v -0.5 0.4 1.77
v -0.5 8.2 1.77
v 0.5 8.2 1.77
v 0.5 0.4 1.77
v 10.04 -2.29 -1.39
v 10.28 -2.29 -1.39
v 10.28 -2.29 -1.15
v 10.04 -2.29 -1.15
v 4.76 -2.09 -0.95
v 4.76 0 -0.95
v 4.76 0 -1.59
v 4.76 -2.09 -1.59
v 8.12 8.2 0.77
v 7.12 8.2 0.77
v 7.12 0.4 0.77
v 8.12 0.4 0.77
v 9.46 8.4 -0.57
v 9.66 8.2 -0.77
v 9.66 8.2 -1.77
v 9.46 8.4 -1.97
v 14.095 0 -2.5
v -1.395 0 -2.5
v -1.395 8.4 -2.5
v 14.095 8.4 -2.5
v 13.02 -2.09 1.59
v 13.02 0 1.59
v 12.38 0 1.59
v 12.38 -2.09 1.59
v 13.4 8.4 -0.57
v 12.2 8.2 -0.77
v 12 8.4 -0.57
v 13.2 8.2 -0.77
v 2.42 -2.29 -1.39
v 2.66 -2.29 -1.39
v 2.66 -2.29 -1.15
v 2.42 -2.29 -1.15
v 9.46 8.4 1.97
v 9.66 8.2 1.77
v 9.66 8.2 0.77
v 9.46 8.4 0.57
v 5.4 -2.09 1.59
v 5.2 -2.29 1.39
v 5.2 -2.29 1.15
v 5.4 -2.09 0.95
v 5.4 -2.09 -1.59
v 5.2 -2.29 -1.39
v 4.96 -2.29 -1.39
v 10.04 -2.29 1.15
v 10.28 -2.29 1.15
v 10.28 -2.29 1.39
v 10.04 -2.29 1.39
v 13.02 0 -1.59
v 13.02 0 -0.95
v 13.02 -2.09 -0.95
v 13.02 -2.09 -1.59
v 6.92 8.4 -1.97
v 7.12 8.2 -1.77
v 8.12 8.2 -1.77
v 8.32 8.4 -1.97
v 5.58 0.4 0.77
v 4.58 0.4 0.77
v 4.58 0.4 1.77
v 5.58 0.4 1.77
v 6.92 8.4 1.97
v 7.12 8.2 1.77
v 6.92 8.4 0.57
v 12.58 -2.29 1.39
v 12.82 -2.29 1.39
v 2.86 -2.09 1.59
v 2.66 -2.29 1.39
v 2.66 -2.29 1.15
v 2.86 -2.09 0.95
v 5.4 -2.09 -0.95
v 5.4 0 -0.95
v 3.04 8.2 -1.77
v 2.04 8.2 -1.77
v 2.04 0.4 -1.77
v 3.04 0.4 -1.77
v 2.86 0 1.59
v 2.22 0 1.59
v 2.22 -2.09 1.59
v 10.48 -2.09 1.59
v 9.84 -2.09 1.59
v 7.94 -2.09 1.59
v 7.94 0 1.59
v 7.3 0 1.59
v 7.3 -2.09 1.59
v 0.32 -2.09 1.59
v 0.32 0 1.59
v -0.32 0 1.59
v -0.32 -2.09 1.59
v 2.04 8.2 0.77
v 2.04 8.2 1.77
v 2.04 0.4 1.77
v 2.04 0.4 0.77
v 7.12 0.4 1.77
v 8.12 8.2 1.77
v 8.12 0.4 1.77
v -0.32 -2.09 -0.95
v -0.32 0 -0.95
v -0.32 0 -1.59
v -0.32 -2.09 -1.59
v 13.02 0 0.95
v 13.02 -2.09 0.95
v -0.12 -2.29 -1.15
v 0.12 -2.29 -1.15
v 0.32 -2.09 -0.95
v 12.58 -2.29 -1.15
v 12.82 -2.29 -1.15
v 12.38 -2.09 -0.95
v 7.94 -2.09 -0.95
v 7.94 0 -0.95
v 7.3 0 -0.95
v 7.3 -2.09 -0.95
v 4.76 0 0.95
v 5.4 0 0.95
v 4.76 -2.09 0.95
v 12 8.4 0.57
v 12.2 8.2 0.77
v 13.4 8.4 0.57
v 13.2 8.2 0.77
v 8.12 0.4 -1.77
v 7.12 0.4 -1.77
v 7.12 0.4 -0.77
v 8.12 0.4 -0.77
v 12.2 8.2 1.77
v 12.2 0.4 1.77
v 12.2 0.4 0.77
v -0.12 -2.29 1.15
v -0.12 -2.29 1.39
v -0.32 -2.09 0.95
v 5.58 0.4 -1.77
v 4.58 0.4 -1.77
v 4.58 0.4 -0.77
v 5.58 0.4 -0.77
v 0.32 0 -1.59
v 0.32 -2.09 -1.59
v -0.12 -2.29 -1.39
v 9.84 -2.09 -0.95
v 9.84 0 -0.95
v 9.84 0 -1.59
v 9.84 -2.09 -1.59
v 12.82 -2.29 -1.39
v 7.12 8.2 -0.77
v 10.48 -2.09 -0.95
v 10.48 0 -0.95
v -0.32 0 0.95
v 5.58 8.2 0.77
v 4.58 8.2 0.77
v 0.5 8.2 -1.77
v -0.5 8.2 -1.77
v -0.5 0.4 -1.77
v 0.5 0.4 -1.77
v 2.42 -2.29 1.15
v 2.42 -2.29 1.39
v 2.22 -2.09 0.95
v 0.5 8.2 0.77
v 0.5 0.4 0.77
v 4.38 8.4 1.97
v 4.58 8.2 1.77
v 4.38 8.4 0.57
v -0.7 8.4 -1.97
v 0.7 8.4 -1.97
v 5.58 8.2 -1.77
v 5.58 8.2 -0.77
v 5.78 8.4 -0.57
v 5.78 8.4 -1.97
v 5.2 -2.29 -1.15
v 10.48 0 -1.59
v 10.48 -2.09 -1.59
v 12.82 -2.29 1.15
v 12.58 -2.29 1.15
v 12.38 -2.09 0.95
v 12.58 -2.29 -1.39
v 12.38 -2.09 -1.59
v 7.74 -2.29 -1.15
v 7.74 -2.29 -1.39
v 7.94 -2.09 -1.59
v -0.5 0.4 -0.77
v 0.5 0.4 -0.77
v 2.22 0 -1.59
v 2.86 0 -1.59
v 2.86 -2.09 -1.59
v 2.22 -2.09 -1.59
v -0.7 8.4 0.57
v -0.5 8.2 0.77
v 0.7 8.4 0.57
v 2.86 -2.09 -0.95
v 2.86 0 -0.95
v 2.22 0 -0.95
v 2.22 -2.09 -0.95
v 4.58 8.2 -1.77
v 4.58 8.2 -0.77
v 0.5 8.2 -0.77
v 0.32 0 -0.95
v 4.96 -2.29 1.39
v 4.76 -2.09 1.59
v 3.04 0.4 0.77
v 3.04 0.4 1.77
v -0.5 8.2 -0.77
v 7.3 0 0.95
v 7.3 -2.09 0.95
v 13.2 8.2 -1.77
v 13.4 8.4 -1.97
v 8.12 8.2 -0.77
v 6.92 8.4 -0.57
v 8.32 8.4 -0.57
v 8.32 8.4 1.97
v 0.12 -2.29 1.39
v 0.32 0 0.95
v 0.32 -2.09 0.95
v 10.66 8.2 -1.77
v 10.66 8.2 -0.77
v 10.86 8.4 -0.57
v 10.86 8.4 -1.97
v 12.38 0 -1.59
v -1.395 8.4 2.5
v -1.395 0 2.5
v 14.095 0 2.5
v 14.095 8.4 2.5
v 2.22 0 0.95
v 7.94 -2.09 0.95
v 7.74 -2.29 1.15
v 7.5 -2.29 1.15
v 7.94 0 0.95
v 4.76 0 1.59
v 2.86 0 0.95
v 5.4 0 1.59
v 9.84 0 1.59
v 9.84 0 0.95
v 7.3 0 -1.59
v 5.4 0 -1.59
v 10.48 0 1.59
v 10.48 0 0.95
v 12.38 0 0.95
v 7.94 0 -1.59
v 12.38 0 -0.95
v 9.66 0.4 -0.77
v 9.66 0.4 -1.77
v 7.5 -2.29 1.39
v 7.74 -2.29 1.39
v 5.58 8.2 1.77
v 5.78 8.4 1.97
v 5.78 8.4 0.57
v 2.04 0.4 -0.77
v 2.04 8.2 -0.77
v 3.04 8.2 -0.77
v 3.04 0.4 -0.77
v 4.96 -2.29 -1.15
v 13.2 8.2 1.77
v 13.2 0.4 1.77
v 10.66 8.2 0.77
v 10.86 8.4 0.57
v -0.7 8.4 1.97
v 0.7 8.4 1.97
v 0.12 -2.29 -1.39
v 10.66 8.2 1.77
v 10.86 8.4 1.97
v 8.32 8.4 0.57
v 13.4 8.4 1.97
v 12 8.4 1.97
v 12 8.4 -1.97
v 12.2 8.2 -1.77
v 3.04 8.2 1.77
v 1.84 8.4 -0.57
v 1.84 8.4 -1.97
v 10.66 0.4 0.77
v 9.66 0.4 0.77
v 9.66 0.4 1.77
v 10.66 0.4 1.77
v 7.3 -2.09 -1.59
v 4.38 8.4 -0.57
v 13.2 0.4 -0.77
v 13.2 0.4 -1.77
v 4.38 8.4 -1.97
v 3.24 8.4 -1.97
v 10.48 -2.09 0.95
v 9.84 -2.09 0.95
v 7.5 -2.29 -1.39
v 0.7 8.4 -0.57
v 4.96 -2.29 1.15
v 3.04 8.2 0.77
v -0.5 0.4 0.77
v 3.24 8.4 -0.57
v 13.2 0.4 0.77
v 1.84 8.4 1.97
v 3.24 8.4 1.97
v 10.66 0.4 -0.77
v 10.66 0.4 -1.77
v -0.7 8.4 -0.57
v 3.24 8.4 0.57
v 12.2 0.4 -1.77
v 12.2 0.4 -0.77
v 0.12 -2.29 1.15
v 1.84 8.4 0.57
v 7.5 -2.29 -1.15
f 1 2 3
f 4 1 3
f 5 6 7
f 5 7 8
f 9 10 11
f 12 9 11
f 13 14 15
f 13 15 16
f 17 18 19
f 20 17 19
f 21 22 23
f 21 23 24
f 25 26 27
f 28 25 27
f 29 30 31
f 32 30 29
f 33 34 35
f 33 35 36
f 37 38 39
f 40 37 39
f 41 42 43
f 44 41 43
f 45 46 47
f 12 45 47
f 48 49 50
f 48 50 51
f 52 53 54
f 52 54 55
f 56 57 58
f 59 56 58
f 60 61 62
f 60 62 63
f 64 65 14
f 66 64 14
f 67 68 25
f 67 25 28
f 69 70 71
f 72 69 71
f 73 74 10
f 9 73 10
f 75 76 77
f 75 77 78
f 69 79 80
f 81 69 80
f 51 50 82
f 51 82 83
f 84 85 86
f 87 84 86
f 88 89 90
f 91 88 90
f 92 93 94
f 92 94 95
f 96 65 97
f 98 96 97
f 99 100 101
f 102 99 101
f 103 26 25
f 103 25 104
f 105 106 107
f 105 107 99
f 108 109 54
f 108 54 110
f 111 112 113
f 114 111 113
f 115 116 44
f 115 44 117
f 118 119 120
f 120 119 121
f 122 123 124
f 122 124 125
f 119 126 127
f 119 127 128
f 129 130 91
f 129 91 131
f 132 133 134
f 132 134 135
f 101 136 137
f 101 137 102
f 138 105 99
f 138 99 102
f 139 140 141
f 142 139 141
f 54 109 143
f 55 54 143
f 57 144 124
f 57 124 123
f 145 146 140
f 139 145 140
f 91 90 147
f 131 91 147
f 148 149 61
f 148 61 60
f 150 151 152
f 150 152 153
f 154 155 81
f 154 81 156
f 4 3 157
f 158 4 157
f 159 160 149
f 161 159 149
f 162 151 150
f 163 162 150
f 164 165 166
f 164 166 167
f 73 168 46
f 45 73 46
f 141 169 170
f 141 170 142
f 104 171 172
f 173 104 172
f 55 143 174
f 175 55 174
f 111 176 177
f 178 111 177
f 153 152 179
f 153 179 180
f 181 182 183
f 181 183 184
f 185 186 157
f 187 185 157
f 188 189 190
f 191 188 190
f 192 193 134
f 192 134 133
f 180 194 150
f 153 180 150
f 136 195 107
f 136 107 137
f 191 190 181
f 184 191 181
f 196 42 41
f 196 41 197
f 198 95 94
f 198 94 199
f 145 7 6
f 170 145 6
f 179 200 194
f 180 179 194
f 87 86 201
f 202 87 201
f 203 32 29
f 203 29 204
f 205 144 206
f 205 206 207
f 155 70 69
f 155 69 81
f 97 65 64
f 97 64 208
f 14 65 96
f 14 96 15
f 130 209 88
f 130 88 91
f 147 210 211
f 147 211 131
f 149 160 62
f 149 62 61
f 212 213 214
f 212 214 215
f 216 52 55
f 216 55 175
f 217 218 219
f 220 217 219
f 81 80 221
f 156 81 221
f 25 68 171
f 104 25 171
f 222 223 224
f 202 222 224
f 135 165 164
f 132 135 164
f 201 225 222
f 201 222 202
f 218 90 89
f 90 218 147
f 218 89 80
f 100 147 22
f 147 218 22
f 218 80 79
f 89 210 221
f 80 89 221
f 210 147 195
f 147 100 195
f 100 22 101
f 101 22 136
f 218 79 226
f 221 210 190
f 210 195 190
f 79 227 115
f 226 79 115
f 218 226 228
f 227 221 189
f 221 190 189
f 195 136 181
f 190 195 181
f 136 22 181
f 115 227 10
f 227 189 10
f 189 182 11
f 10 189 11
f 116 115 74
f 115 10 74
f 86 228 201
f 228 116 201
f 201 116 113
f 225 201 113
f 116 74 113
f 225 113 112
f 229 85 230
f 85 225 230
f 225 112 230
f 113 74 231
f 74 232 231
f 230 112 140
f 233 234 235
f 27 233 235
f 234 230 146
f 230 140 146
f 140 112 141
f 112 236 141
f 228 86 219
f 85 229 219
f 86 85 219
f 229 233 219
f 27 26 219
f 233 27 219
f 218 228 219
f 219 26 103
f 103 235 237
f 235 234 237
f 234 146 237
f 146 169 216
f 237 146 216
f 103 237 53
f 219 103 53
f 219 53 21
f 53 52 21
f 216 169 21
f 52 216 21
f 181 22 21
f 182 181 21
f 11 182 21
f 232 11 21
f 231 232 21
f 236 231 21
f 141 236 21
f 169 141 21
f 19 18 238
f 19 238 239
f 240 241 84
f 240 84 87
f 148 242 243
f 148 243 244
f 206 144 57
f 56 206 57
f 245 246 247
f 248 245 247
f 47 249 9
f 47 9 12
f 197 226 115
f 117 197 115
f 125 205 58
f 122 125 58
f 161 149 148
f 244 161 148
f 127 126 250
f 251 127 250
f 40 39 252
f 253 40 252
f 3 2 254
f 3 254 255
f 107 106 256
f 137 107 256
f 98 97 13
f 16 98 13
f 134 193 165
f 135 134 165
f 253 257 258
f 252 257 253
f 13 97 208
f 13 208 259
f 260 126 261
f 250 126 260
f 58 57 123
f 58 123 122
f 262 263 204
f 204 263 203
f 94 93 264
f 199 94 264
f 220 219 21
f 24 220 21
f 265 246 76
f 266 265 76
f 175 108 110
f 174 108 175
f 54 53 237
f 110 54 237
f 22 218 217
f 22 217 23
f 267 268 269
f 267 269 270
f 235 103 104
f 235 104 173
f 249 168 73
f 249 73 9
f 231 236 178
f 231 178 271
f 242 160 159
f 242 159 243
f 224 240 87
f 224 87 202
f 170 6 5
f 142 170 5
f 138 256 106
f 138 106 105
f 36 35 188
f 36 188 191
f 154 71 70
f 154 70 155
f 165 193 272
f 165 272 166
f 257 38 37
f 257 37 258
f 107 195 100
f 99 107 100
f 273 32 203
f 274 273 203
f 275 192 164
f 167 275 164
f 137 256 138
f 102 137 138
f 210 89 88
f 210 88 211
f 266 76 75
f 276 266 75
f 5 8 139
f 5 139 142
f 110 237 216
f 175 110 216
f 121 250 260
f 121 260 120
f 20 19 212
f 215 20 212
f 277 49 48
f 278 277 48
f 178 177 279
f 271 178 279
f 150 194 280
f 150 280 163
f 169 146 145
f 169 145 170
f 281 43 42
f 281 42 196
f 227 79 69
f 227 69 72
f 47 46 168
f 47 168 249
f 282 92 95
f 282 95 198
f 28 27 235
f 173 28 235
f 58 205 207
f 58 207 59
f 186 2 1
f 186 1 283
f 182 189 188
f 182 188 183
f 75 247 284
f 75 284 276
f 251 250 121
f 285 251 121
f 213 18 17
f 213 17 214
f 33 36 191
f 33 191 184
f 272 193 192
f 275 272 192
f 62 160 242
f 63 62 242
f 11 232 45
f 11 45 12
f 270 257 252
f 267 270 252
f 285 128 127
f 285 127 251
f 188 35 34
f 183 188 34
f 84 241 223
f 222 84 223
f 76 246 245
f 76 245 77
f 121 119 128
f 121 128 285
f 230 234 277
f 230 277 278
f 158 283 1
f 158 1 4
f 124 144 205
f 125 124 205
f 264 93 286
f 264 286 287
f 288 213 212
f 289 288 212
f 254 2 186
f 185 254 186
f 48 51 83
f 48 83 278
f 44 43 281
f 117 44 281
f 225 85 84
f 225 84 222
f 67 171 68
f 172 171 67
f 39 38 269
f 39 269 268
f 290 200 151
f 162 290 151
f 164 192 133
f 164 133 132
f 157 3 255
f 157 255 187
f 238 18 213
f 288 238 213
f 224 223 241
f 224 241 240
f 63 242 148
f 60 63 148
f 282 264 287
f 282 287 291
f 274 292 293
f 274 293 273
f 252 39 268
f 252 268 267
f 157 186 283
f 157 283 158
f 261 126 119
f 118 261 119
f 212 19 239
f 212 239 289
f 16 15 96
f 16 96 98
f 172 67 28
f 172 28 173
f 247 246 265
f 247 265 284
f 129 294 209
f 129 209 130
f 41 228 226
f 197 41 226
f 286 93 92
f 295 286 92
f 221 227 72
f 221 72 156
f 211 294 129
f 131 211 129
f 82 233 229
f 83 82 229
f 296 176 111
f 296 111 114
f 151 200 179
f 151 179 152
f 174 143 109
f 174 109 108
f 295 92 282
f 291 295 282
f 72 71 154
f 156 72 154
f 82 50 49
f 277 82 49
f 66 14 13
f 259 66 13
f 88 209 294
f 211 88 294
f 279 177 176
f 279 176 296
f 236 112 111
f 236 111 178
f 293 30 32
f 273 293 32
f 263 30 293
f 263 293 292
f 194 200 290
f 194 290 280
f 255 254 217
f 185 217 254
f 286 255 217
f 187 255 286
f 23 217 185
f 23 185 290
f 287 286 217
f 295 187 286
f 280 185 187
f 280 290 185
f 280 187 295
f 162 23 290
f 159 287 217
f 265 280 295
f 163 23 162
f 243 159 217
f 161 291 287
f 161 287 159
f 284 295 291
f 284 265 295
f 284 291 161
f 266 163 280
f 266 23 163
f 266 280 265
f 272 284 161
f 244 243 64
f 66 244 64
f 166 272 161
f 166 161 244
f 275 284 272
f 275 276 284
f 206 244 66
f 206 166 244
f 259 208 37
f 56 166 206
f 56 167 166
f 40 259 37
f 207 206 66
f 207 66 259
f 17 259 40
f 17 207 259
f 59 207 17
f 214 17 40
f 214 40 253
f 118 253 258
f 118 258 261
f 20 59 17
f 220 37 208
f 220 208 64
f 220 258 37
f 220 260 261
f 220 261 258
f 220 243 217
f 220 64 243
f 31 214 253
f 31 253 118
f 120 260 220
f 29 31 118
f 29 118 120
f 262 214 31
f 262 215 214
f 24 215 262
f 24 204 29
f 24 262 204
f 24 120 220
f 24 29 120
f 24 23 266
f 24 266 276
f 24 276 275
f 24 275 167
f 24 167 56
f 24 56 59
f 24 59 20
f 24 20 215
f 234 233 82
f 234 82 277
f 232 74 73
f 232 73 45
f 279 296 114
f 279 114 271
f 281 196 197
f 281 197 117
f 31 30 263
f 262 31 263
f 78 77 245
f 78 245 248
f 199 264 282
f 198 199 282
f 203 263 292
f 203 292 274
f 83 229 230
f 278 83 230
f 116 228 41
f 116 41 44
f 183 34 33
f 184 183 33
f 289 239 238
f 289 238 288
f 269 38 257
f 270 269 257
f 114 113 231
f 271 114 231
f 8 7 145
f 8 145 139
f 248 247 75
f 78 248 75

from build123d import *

# Parameters (mm, degrees)
SKETCH_1_W                         = 2.79
SKETCH_1_H                         = 5
EXTRUDE_1_DEPTH                    = 8.4
SKETCH_2_W                         = 1
SKETCH_2_H                         = 1
CUT_EXTRUDE_1_DEPTH                = 8
CHAMFER_1_SIZE                     = 0.2
SKETCH_3_W                         = 0.64
SKETCH_3_H                         = 0.64
EXTRUDE_2_DEPTH                    = 2.29
CHAMFER_2_SIZE                     = 0.2
PATTERN_LINEAR_1_COUNT             = 6
PATTERN_LINEAR_1_PITCH             = 2.54
CHAMFER_1_OF_PATTERN_LINEAR_1_SIZE = 0.2
CHAMFER_2_OF_PATTERN_LINEAR_1_SIZE = 0.2


with BuildPart() as part:
    # Эскиз1 → Бобышка-Вытянуть1 (new body)
    with BuildSketch(Plane(origin=(0, 0, 0), x_dir=(1, 0, 0), z_dir=(0, 1, 0))):
        Rectangle(SKETCH_1_W, SKETCH_1_H)
    extrude_1 = extrude(amount=EXTRUDE_1_DEPTH)

    # Эскиз2 → Вырез-Вытянуть1 (cut)
    with BuildSketch(Plane(origin=(0, 8.4, 0), x_dir=(1, 0, 0), z_dir=(0, 1, 0))):
        with Locations((0, 1.27)):
            Rectangle(SKETCH_2_W, SKETCH_2_H)
        with Locations((0, -1.27)):
            Rectangle(SKETCH_2_W, SKETCH_2_H)
    cut_extrude_1 = extrude(amount=-CUT_EXTRUDE_1_DEPTH, mode=Mode.SUBTRACT)

    # Фаска1
    chamfer_1_edges = [part.edges().sort_by_distance(p)[0] for p in [
        (0.5, 8.4, -1.27),
        (0, 8.4, -1.77),
        (-0.5, 8.4, -1.27),
        (0, 8.4, -0.77),
        (0, 8.4, 1.77),
        (0.5, 8.4, 1.27),
        (0, 8.4, 0.77),
        (-0.5, 8.4, 1.27),
    ]]
    chamfer(chamfer_1_edges, length=CHAMFER_1_SIZE)

    # Эскиз3 → Бобышка-Вытянуть2 (add)
    with BuildSketch(Plane(origin=(0, 0, 0), x_dir=(-1, 0, 0), z_dir=(0, -1, 0))):
        with Locations((0, 1.27)):
            Rectangle(SKETCH_3_W, SKETCH_3_H)
        with Locations((0, -1.27)):
            Rectangle(SKETCH_3_W, SKETCH_3_H)
    extrude_2 = extrude(amount=EXTRUDE_2_DEPTH)

    # Фаска2
    chamfer_2_edges = [part.edges().sort_by_distance(p)[0] for p in [
        (0.32, -2.29, -1.27),
        (0, -2.29, -0.95),
        (-0.32, -2.29, -1.27),
        (0, -2.29, -1.59),
        (-0.32, -2.29, 1.27),
        (0, -2.29, 0.95),
        (0.32, -2.29, 1.27),
        (0, -2.29, 1.59),
    ]]
    chamfer(chamfer_2_edges, length=CHAMFER_2_SIZE)

    # Линейный массив1: Бобышка-Вытянуть1, Вырез-Вытянуть1, Бобышка-Вытянуть2 ×6
    with Locations(*[(i * PATTERN_LINEAR_1_PITCH, 0, 0) for i in range(1, PATTERN_LINEAR_1_COUNT)]):
        add(extrude_1)
        add(cut_extrude_1, mode=Mode.SUBTRACT)
        add(extrude_2)

    # Фаска1 of Линейный массив1
    chamfer_1_of_pattern_linear_1_edges = [part.edges().sort_by_distance(p)[0] for p in [
        (3.04, 8.4, -1.27),
        (2.54, 8.4, -1.77),
        (2.04, 8.4, -1.27),
        (2.54, 8.4, -0.77),
        (2.54, 8.4, 1.77),
        (3.04, 8.4, 1.27),
        (2.54, 8.4, 0.77),
        (2.04, 8.4, 1.27),
        (5.58, 8.4, -1.27),
        (5.08, 8.4, -1.77),
        (4.58, 8.4, -1.27),
        (5.08, 8.4, -0.77),
        (5.08, 8.4, 1.77),
        (5.58, 8.4, 1.27),
        (5.08, 8.4, 0.77),
        (4.58, 8.4, 1.27),
        (8.12, 8.4, -1.27),
        (7.62, 8.4, -1.77),
        (7.12, 8.4, -1.27),
        (7.62, 8.4, -0.77),
        (7.62, 8.4, 1.77),
        (8.12, 8.4, 1.27),
        (7.62, 8.4, 0.77),
        (7.12, 8.4, 1.27),
        (10.66, 8.4, -1.27),
        (10.16, 8.4, -1.77),
        (9.66, 8.4, -1.27),
        (10.16, 8.4, -0.77),
        (10.16, 8.4, 1.77),
        (10.66, 8.4, 1.27),
        (10.16, 8.4, 0.77),
        (9.66, 8.4, 1.27),
        (13.2, 8.4, -1.27),
        (12.7, 8.4, -1.77),
        (12.2, 8.4, -1.27),
        (12.7, 8.4, -0.77),
        (12.7, 8.4, 1.77),
        (13.2, 8.4, 1.27),
        (12.7, 8.4, 0.77),
        (12.2, 8.4, 1.27),
    ]]
    chamfer(chamfer_1_of_pattern_linear_1_edges, length=CHAMFER_1_OF_PATTERN_LINEAR_1_SIZE)

    # Фаска2 of Линейный массив1
    chamfer_2_of_pattern_linear_1_edges = [part.edges().sort_by_distance(p)[0] for p in [
        (2.86, -2.29, -1.27),
        (2.54, -2.29, -0.95),
        (2.22, -2.29, -1.27),
        (2.54, -2.29, -1.59),
        (2.22, -2.29, 1.27),
        (2.54, -2.29, 0.95),
        (2.86, -2.29, 1.27),
        (2.54, -2.29, 1.59),
        (5.4, -2.29, -1.27),
        (5.08, -2.29, -0.95),
        (4.76, -2.29, -1.27),
        (5.08, -2.29, -1.59),
        (4.76, -2.29, 1.27),
        (5.08, -2.29, 0.95),
        (5.4, -2.29, 1.27),
        (5.08, -2.29, 1.59),
        (7.94, -2.29, -1.27),
        (7.62, -2.29, -0.95),
        (7.3, -2.29, -1.27),
        (7.62, -2.29, -1.59),
        (7.3, -2.29, 1.27),
        (7.62, -2.29, 0.95),
        (7.94, -2.29, 1.27),
        (7.62, -2.29, 1.59),
        (10.48, -2.29, -1.27),
        (10.16, -2.29, -0.95),
        (9.84, -2.29, -1.27),
        (10.16, -2.29, -1.59),
        (9.84, -2.29, 1.27),
        (10.16, -2.29, 0.95),
        (10.48, -2.29, 1.27),
        (10.16, -2.29, 1.59),
        (13.02, -2.29, -1.27),
        (12.7, -2.29, -0.95),
        (12.38, -2.29, -1.27),
        (12.7, -2.29, -1.59),
        (12.38, -2.29, 1.27),
        (12.7, -2.29, 0.95),
        (13.02, -2.29, 1.27),
        (12.7, -2.29, 1.59),
    ]]
    chamfer(chamfer_2_of_pattern_linear_1_edges, length=CHAMFER_2_OF_PATTERN_LINEAR_1_SIZE)


solid = part.part
